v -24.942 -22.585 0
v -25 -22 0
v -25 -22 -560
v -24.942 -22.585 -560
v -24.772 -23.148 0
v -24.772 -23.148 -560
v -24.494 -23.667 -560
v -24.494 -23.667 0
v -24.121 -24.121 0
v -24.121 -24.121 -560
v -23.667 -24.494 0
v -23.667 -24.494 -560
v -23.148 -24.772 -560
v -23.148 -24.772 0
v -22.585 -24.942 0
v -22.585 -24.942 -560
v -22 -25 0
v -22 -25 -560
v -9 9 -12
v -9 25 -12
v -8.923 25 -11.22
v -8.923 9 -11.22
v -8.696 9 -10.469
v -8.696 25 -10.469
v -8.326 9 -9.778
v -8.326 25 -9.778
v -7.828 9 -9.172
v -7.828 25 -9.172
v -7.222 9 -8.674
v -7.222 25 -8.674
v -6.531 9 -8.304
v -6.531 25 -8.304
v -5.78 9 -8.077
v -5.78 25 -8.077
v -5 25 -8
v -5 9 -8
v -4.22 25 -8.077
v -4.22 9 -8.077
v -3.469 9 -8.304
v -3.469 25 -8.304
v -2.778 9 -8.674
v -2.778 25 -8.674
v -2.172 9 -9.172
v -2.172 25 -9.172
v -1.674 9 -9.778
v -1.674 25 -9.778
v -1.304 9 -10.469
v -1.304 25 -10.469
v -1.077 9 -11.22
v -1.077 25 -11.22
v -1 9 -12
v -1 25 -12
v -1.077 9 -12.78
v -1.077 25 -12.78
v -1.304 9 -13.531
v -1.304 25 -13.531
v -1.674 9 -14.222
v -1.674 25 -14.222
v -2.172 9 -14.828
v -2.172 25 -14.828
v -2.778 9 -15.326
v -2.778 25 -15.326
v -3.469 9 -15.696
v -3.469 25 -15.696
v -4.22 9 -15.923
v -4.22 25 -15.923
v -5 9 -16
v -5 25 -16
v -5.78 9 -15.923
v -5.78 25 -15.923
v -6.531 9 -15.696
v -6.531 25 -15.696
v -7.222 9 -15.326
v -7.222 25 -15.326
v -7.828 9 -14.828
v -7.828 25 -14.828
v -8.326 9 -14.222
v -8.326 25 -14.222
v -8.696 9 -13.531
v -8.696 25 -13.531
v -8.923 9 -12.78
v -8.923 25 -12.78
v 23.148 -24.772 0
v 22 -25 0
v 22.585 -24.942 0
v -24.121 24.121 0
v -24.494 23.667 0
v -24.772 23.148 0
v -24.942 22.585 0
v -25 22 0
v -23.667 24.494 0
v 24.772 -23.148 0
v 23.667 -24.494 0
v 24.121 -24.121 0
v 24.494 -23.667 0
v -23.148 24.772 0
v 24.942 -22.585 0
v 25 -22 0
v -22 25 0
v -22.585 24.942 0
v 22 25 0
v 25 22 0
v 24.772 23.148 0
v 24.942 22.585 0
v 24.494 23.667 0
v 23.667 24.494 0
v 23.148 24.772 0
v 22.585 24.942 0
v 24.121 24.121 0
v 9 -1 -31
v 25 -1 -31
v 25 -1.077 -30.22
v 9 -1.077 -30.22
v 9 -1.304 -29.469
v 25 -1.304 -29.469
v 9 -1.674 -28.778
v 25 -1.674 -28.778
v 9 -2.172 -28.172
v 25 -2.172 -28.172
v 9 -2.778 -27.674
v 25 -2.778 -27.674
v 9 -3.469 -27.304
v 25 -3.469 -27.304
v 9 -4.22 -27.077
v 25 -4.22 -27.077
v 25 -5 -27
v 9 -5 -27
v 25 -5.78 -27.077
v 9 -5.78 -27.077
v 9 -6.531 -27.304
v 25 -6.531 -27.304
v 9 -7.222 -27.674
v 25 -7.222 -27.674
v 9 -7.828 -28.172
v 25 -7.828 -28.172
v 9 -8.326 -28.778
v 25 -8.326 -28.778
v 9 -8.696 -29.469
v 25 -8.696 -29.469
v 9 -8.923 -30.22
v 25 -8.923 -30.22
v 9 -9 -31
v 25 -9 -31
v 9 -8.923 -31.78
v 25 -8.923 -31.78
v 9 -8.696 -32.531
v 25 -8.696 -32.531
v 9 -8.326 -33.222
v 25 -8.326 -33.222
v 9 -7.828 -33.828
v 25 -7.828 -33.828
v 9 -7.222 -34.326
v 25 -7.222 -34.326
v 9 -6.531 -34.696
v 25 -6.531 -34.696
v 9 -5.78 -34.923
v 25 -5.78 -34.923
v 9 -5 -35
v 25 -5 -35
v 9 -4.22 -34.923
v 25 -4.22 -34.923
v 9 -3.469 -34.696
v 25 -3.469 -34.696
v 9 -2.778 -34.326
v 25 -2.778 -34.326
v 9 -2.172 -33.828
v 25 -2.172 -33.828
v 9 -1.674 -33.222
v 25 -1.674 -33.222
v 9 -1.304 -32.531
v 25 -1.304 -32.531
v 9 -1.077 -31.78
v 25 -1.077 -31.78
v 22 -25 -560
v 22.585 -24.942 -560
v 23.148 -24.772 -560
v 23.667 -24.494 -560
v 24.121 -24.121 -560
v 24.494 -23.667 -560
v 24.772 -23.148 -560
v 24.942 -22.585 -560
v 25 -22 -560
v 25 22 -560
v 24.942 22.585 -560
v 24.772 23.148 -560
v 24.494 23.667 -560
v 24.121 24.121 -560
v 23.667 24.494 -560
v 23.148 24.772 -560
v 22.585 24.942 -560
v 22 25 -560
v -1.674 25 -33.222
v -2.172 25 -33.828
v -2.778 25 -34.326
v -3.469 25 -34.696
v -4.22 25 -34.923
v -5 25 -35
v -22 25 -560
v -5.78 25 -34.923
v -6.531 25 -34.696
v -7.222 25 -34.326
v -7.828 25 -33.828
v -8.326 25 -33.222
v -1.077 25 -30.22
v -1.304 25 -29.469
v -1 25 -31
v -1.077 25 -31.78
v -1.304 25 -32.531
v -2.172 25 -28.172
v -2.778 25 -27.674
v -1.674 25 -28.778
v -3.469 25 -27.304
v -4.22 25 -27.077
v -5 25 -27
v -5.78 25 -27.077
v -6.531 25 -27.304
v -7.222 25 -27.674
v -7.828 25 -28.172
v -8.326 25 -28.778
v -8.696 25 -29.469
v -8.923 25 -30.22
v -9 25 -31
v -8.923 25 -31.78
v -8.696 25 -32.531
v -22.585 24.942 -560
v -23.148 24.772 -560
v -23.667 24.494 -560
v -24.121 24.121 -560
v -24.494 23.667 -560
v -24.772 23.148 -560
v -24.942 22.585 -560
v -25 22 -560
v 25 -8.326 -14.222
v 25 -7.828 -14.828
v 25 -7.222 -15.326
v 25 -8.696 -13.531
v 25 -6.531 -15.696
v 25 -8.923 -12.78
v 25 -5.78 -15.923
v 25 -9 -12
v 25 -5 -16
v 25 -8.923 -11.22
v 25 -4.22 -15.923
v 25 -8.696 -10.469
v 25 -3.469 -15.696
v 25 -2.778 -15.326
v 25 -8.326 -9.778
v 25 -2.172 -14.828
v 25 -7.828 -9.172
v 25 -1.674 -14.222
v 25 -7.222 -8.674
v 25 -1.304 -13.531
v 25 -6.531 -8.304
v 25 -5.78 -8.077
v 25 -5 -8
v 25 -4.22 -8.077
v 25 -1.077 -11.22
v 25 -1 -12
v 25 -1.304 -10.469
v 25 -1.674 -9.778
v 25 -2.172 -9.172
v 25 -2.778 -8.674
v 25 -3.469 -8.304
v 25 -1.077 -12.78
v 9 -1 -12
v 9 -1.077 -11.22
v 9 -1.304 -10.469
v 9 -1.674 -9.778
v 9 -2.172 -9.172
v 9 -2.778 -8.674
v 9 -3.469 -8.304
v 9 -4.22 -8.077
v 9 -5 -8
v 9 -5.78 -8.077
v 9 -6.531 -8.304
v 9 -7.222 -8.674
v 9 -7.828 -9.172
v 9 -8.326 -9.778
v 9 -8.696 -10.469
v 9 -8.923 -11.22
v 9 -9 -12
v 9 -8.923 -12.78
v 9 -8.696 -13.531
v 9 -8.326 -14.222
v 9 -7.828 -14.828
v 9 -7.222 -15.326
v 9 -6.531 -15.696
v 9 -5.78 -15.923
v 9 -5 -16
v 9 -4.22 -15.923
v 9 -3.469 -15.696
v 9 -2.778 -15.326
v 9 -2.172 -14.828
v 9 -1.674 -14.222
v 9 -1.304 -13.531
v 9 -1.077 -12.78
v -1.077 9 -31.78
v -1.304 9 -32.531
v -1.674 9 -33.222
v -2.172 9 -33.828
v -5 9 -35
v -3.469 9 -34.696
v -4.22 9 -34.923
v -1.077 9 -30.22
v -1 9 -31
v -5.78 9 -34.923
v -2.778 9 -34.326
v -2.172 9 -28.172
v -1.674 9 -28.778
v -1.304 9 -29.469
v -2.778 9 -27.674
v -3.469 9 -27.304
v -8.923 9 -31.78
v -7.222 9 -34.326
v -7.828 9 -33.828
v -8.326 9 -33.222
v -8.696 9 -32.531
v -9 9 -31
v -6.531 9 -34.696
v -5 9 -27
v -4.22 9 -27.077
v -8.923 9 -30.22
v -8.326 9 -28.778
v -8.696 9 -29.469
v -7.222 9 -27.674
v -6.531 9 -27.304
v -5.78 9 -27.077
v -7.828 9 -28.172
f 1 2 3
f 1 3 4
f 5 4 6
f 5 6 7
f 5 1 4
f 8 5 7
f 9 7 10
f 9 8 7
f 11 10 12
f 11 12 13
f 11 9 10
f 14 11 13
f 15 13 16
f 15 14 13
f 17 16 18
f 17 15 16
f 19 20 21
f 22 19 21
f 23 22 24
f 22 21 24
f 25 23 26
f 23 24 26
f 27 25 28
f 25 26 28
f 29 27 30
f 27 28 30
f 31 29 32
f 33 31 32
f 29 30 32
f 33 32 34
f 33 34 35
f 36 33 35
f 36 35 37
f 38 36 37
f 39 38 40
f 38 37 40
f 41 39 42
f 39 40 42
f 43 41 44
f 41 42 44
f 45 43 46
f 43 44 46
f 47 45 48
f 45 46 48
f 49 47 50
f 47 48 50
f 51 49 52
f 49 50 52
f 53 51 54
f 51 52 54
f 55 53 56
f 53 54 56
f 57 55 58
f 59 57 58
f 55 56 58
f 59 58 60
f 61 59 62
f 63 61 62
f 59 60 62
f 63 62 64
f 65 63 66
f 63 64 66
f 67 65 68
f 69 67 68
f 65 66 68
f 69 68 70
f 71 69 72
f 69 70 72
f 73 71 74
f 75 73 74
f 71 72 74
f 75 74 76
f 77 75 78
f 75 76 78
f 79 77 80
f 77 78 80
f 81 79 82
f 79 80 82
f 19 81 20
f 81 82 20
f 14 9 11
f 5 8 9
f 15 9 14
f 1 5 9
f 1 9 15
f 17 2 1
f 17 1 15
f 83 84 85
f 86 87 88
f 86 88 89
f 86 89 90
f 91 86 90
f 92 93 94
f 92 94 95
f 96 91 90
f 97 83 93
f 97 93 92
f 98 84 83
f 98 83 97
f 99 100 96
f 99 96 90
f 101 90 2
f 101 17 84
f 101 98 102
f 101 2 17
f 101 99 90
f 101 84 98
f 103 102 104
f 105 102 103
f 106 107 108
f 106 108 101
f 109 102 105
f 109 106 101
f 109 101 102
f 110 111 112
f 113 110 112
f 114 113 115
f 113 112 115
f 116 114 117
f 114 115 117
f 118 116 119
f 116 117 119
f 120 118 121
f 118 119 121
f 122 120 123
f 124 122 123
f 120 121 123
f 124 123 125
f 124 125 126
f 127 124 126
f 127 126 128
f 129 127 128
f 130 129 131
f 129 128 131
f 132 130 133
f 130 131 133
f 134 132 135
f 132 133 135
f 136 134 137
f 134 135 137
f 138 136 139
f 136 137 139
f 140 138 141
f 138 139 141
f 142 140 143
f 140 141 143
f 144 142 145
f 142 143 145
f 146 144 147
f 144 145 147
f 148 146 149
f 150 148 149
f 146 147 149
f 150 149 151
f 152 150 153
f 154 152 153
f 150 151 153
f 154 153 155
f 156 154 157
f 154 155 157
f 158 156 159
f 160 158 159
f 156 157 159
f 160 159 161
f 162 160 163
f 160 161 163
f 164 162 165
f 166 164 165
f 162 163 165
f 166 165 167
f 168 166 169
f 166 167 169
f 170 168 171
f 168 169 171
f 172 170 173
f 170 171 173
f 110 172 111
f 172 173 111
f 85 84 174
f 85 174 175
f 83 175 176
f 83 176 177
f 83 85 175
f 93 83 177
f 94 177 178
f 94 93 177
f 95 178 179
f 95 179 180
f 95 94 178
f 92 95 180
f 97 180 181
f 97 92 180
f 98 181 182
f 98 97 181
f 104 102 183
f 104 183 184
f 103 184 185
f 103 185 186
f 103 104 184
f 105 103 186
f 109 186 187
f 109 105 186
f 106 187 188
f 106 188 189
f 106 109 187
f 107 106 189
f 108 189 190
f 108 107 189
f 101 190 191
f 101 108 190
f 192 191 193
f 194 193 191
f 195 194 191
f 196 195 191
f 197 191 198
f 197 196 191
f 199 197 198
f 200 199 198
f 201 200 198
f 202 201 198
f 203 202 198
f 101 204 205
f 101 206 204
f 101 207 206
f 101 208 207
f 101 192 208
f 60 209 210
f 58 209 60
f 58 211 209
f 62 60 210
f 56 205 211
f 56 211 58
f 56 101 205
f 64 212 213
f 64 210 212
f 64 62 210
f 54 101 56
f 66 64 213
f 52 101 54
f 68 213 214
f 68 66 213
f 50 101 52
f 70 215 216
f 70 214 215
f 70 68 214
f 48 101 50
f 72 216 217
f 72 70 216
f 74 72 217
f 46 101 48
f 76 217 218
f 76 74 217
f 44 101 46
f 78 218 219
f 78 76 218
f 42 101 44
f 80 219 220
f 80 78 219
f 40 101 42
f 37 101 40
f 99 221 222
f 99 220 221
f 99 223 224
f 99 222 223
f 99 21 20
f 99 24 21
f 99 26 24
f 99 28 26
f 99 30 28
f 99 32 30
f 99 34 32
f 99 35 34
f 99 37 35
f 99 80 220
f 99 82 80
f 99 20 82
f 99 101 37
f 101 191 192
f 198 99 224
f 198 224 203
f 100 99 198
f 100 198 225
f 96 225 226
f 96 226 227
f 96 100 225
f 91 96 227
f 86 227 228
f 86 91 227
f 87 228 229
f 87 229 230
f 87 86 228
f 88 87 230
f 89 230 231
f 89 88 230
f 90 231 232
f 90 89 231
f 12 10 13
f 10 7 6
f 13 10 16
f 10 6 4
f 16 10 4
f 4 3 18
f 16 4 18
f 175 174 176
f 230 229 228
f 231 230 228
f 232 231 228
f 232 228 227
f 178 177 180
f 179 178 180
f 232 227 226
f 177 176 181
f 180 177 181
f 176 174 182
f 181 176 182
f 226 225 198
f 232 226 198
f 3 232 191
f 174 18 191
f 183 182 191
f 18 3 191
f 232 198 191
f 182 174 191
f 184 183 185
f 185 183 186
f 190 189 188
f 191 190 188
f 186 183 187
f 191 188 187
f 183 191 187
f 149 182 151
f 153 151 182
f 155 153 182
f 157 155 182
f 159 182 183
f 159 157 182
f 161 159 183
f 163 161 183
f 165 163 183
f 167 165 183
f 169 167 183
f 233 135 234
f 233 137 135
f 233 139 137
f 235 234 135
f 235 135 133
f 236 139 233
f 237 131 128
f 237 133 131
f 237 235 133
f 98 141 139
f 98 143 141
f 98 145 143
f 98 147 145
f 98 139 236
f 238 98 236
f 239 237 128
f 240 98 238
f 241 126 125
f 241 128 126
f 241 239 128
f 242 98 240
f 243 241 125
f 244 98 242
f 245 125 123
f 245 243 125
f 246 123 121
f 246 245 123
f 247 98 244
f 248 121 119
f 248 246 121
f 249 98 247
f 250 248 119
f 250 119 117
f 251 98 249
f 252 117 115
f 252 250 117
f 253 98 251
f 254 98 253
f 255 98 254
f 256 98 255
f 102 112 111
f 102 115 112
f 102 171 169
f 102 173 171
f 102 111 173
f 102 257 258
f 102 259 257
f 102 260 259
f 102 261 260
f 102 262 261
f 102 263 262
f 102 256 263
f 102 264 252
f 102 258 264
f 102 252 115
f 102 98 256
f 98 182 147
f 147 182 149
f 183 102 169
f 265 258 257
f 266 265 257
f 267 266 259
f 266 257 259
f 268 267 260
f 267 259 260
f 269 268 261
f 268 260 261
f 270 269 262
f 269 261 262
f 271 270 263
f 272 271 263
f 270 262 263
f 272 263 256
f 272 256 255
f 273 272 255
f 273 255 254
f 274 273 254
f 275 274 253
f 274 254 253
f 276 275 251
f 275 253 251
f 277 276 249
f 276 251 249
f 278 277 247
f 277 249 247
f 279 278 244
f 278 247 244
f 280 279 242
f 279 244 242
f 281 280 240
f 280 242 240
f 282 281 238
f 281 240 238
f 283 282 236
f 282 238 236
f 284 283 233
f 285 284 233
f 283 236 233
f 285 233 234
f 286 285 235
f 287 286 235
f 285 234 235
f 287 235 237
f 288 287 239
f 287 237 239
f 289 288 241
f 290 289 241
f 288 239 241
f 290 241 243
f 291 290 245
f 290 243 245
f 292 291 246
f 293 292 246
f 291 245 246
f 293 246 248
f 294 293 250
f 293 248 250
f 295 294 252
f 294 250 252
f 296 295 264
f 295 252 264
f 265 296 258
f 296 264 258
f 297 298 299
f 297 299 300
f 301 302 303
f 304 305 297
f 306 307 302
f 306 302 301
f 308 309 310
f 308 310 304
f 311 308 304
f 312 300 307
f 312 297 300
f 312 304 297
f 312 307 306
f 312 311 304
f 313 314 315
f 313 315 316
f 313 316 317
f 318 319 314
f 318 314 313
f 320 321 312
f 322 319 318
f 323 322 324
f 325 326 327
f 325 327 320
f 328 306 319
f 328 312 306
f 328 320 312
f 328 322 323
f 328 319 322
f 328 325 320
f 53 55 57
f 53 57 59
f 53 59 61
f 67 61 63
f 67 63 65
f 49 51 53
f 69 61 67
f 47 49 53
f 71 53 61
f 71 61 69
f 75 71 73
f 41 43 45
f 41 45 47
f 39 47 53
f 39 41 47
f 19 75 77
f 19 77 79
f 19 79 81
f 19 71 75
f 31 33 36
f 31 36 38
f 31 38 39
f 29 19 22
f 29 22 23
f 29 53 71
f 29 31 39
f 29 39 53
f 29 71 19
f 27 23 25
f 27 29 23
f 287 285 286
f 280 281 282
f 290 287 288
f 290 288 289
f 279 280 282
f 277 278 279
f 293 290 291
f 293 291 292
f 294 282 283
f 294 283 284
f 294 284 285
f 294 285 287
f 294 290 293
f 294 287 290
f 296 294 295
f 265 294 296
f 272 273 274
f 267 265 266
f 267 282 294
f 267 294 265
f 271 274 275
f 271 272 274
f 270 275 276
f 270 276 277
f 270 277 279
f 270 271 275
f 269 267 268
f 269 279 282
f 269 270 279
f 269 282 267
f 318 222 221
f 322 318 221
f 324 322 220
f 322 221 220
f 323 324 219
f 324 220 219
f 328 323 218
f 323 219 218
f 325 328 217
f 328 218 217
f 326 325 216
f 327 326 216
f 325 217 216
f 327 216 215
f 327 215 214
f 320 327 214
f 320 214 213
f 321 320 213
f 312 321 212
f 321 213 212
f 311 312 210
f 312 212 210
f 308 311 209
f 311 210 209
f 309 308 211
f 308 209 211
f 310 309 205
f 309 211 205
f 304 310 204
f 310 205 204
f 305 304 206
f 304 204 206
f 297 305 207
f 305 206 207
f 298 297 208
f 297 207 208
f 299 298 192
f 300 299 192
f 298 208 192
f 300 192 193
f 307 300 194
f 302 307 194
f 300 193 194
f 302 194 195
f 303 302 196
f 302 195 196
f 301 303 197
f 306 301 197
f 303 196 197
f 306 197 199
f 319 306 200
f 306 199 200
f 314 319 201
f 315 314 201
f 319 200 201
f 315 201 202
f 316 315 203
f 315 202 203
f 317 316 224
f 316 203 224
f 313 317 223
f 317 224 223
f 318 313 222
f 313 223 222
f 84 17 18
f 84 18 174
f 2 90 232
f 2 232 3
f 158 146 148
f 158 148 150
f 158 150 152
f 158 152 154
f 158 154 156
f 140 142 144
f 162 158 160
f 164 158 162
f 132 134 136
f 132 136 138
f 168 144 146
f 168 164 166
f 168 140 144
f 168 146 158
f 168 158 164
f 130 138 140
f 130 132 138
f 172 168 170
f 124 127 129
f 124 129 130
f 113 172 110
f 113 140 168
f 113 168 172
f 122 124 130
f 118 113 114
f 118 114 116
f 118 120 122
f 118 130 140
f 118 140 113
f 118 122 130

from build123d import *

# Parameters (mm, degrees)
F1_DEPTH = 560
F2_R     = 4
F4_DEPTH = 16
F3_R     = 4
F5_DEPTH = 16


with BuildPart() as f1:
    # F0 (on Top) → F1 (new body)
    with BuildSketch(Plane.XY):
        with BuildLine():
            ThreePointArc((25, 22), (24.12132, 24.12132), (22, 25))
            Line((22, 25), (-22, 25))
            ThreePointArc((-22, 25), (-24.12132, 24.12132), (-25, 22))
            Line((-25, 22), (-25, -22))
            ThreePointArc((-25, -22), (-24.12132, -24.12132), (-22, -25))
            Line((-22, -25), (22, -25))
            ThreePointArc((22, -25), (24.12132, -24.12132), (25, -22))
            Line((25, -22), (25, 22))
        make_face()
    extrude(amount=-F1_DEPTH)

    # F2 (on face) → F4 (cut)
    with BuildSketch(Plane.YZ.offset(25)):
        with Locations((-5, -12)):
            Circle(F2_R)
        with Locations((-5, -31)):
            Circle(F2_R)
    extrude(amount=-F4_DEPTH, mode=Mode.SUBTRACT)

    # F3 (on face) → F5 (cut)
    with BuildSketch(Plane(origin=(0, 25, 0), x_dir=(-1, 0, 0), z_dir=(0, 1, 0))):
        with Locations((5, -12)):
            Circle(F3_R)
        with Locations((5, -31)):
            Circle(F3_R)
    extrude(amount=-F5_DEPTH, mode=Mode.SUBTRACT)


solid = f1.part
